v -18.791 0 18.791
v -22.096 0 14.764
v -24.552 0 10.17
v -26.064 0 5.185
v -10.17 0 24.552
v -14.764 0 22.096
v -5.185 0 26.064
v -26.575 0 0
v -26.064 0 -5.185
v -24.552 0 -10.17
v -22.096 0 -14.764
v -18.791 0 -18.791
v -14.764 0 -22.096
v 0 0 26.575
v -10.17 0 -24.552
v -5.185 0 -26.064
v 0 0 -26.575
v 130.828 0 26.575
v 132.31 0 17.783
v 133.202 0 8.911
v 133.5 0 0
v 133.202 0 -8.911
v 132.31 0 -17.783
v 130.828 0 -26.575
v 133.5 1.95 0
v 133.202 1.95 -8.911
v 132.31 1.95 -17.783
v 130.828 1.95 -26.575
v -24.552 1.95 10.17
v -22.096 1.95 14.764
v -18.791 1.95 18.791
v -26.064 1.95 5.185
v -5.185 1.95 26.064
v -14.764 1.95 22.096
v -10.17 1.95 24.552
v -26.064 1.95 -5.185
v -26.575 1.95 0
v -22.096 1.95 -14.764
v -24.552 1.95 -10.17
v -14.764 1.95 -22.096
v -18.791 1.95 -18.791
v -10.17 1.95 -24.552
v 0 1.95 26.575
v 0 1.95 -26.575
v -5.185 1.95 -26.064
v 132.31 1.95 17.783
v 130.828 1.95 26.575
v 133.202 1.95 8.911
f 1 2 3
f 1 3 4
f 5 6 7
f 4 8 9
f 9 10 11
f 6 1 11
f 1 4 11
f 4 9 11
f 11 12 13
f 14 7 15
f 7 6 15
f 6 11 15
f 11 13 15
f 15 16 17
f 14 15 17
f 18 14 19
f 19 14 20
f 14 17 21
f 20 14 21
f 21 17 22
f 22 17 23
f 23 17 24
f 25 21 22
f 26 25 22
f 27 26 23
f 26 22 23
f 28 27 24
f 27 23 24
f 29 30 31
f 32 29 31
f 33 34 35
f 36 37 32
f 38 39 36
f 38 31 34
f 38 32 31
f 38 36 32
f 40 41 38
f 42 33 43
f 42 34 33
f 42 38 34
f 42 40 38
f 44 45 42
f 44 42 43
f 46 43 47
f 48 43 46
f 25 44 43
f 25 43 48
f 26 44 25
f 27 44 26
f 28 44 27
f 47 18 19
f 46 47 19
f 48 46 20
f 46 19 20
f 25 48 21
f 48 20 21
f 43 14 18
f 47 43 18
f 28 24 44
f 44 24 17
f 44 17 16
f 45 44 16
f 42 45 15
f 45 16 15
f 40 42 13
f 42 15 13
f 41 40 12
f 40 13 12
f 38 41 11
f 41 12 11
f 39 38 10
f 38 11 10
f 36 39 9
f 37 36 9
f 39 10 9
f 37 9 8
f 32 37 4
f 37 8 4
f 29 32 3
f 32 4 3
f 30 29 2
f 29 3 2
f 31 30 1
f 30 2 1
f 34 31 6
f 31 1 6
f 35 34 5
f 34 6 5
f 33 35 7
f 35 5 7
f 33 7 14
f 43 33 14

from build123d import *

# Parameters (mm, degrees)
BOSS_EXTRUDE1_DEPTH = 1.95


with BuildPart() as part:
    # Sketch1 → Boss-Extrude1 (new body)
    with BuildSketch(Plane(origin=(0, 0, 0), x_dir=(1, 0, 0), z_dir=(0, 1, 0))):
        with BuildLine():
            Line((0, -26.575), (130.828205579, -26.575))
            ThreePointArc((130.828205579, -26.575), (132.830371988, -13.354485299), (133.5, 0))
            ThreePointArc((133.5, 0), (132.830371988, 13.354485299), (130.828205579, 26.575))
            Line((130.828205579, 26.575), (0, 26.575))
            ThreePointArc((0, 26.575), (-26.575, 0), (0, -26.575))
        make_face()
    extrude(amount=BOSS_EXTRUDE1_DEPTH)


solid = part.part
